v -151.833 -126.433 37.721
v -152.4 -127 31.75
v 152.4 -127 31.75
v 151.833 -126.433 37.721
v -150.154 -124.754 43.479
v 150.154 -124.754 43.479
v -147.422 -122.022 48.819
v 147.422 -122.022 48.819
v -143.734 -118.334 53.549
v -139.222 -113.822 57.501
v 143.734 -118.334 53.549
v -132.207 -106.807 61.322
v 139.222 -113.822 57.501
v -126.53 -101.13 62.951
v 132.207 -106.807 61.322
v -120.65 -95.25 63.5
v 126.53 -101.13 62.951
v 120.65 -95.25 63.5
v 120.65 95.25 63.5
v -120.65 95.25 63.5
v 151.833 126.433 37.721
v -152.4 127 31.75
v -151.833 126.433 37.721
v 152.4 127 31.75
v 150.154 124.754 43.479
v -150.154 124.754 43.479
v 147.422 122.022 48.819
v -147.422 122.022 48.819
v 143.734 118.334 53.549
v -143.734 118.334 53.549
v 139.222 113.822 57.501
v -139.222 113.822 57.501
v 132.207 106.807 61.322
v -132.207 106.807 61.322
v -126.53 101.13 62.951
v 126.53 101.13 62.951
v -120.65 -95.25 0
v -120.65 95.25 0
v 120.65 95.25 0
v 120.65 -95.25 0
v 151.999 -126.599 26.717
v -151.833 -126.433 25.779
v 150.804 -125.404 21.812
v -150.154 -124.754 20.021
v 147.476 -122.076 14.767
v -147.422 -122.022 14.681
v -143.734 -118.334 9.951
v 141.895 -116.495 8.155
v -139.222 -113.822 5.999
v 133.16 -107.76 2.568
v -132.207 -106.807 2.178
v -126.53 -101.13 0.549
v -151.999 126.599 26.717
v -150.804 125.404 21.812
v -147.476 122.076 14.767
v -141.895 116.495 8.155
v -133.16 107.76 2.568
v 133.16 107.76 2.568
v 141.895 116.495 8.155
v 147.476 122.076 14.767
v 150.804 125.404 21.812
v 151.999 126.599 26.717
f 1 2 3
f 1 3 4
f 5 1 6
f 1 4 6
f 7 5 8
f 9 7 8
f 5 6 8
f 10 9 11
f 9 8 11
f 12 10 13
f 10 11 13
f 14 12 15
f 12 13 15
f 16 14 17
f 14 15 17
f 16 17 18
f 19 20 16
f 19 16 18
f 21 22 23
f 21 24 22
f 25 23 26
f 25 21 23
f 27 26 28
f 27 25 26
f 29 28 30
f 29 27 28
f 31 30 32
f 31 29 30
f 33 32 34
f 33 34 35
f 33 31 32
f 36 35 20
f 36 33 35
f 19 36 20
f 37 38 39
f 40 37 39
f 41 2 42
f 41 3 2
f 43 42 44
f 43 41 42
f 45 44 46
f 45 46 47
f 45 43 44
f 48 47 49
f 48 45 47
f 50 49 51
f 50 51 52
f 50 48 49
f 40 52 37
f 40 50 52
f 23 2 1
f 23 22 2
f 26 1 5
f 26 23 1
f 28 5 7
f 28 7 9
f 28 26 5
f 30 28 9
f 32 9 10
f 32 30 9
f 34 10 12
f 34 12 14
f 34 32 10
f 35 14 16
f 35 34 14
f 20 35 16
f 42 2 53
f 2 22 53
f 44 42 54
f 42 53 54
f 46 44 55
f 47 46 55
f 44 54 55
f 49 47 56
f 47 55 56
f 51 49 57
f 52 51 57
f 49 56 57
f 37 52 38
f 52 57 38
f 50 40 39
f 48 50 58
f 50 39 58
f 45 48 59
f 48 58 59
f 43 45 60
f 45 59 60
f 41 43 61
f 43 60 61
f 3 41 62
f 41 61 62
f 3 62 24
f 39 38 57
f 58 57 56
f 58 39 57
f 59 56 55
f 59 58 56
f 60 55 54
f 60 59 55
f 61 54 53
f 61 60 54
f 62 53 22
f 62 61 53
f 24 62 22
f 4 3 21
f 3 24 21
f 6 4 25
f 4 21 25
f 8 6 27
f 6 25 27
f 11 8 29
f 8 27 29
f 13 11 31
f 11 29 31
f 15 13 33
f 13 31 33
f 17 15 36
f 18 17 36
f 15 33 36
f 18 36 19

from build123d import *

# Parameters (mm, degrees)
F0_W     = 304.8
F0_H     = 254
F1_DEPTH = 63.5
F2_R     = 31.75
F3_R     = 31.74999


# Not quite as in the source:
# - a fillet or chamfer is up to 0.001 mm smaller than in the source, because OpenCascade refuses the exact size


with BuildPart() as f1:
    # F0 (on Top) → F1 (new body)
    with BuildSketch(Plane.XY):
        Rectangle(F0_W, F0_H)
    extrude(amount=F1_DEPTH)

    # F2
    f2_edges = [f1.edges().sort_by_distance(p)[0] for p in [
        (152.4, 0, 63.5),
        (0, 127, 63.5),
        (-152.4, 0, 63.5),
        (0, -127, 63.5),
    ]]
    fillet(f2_edges, radius=F2_R)

    # F3 (radius 31.75 in the source; OpenCascade refuses exactly that, so slightly less here)
    f3_edges = [f1.edges().sort_by_distance(p)[0] for p in [
        (152.4, 0, 0),
        (0, 127, 0),
        (-152.4, 0, 0),
        (0, -127, 0),
    ]]
    fillet(f3_edges, radius=F3_R)


solid = f1.part
